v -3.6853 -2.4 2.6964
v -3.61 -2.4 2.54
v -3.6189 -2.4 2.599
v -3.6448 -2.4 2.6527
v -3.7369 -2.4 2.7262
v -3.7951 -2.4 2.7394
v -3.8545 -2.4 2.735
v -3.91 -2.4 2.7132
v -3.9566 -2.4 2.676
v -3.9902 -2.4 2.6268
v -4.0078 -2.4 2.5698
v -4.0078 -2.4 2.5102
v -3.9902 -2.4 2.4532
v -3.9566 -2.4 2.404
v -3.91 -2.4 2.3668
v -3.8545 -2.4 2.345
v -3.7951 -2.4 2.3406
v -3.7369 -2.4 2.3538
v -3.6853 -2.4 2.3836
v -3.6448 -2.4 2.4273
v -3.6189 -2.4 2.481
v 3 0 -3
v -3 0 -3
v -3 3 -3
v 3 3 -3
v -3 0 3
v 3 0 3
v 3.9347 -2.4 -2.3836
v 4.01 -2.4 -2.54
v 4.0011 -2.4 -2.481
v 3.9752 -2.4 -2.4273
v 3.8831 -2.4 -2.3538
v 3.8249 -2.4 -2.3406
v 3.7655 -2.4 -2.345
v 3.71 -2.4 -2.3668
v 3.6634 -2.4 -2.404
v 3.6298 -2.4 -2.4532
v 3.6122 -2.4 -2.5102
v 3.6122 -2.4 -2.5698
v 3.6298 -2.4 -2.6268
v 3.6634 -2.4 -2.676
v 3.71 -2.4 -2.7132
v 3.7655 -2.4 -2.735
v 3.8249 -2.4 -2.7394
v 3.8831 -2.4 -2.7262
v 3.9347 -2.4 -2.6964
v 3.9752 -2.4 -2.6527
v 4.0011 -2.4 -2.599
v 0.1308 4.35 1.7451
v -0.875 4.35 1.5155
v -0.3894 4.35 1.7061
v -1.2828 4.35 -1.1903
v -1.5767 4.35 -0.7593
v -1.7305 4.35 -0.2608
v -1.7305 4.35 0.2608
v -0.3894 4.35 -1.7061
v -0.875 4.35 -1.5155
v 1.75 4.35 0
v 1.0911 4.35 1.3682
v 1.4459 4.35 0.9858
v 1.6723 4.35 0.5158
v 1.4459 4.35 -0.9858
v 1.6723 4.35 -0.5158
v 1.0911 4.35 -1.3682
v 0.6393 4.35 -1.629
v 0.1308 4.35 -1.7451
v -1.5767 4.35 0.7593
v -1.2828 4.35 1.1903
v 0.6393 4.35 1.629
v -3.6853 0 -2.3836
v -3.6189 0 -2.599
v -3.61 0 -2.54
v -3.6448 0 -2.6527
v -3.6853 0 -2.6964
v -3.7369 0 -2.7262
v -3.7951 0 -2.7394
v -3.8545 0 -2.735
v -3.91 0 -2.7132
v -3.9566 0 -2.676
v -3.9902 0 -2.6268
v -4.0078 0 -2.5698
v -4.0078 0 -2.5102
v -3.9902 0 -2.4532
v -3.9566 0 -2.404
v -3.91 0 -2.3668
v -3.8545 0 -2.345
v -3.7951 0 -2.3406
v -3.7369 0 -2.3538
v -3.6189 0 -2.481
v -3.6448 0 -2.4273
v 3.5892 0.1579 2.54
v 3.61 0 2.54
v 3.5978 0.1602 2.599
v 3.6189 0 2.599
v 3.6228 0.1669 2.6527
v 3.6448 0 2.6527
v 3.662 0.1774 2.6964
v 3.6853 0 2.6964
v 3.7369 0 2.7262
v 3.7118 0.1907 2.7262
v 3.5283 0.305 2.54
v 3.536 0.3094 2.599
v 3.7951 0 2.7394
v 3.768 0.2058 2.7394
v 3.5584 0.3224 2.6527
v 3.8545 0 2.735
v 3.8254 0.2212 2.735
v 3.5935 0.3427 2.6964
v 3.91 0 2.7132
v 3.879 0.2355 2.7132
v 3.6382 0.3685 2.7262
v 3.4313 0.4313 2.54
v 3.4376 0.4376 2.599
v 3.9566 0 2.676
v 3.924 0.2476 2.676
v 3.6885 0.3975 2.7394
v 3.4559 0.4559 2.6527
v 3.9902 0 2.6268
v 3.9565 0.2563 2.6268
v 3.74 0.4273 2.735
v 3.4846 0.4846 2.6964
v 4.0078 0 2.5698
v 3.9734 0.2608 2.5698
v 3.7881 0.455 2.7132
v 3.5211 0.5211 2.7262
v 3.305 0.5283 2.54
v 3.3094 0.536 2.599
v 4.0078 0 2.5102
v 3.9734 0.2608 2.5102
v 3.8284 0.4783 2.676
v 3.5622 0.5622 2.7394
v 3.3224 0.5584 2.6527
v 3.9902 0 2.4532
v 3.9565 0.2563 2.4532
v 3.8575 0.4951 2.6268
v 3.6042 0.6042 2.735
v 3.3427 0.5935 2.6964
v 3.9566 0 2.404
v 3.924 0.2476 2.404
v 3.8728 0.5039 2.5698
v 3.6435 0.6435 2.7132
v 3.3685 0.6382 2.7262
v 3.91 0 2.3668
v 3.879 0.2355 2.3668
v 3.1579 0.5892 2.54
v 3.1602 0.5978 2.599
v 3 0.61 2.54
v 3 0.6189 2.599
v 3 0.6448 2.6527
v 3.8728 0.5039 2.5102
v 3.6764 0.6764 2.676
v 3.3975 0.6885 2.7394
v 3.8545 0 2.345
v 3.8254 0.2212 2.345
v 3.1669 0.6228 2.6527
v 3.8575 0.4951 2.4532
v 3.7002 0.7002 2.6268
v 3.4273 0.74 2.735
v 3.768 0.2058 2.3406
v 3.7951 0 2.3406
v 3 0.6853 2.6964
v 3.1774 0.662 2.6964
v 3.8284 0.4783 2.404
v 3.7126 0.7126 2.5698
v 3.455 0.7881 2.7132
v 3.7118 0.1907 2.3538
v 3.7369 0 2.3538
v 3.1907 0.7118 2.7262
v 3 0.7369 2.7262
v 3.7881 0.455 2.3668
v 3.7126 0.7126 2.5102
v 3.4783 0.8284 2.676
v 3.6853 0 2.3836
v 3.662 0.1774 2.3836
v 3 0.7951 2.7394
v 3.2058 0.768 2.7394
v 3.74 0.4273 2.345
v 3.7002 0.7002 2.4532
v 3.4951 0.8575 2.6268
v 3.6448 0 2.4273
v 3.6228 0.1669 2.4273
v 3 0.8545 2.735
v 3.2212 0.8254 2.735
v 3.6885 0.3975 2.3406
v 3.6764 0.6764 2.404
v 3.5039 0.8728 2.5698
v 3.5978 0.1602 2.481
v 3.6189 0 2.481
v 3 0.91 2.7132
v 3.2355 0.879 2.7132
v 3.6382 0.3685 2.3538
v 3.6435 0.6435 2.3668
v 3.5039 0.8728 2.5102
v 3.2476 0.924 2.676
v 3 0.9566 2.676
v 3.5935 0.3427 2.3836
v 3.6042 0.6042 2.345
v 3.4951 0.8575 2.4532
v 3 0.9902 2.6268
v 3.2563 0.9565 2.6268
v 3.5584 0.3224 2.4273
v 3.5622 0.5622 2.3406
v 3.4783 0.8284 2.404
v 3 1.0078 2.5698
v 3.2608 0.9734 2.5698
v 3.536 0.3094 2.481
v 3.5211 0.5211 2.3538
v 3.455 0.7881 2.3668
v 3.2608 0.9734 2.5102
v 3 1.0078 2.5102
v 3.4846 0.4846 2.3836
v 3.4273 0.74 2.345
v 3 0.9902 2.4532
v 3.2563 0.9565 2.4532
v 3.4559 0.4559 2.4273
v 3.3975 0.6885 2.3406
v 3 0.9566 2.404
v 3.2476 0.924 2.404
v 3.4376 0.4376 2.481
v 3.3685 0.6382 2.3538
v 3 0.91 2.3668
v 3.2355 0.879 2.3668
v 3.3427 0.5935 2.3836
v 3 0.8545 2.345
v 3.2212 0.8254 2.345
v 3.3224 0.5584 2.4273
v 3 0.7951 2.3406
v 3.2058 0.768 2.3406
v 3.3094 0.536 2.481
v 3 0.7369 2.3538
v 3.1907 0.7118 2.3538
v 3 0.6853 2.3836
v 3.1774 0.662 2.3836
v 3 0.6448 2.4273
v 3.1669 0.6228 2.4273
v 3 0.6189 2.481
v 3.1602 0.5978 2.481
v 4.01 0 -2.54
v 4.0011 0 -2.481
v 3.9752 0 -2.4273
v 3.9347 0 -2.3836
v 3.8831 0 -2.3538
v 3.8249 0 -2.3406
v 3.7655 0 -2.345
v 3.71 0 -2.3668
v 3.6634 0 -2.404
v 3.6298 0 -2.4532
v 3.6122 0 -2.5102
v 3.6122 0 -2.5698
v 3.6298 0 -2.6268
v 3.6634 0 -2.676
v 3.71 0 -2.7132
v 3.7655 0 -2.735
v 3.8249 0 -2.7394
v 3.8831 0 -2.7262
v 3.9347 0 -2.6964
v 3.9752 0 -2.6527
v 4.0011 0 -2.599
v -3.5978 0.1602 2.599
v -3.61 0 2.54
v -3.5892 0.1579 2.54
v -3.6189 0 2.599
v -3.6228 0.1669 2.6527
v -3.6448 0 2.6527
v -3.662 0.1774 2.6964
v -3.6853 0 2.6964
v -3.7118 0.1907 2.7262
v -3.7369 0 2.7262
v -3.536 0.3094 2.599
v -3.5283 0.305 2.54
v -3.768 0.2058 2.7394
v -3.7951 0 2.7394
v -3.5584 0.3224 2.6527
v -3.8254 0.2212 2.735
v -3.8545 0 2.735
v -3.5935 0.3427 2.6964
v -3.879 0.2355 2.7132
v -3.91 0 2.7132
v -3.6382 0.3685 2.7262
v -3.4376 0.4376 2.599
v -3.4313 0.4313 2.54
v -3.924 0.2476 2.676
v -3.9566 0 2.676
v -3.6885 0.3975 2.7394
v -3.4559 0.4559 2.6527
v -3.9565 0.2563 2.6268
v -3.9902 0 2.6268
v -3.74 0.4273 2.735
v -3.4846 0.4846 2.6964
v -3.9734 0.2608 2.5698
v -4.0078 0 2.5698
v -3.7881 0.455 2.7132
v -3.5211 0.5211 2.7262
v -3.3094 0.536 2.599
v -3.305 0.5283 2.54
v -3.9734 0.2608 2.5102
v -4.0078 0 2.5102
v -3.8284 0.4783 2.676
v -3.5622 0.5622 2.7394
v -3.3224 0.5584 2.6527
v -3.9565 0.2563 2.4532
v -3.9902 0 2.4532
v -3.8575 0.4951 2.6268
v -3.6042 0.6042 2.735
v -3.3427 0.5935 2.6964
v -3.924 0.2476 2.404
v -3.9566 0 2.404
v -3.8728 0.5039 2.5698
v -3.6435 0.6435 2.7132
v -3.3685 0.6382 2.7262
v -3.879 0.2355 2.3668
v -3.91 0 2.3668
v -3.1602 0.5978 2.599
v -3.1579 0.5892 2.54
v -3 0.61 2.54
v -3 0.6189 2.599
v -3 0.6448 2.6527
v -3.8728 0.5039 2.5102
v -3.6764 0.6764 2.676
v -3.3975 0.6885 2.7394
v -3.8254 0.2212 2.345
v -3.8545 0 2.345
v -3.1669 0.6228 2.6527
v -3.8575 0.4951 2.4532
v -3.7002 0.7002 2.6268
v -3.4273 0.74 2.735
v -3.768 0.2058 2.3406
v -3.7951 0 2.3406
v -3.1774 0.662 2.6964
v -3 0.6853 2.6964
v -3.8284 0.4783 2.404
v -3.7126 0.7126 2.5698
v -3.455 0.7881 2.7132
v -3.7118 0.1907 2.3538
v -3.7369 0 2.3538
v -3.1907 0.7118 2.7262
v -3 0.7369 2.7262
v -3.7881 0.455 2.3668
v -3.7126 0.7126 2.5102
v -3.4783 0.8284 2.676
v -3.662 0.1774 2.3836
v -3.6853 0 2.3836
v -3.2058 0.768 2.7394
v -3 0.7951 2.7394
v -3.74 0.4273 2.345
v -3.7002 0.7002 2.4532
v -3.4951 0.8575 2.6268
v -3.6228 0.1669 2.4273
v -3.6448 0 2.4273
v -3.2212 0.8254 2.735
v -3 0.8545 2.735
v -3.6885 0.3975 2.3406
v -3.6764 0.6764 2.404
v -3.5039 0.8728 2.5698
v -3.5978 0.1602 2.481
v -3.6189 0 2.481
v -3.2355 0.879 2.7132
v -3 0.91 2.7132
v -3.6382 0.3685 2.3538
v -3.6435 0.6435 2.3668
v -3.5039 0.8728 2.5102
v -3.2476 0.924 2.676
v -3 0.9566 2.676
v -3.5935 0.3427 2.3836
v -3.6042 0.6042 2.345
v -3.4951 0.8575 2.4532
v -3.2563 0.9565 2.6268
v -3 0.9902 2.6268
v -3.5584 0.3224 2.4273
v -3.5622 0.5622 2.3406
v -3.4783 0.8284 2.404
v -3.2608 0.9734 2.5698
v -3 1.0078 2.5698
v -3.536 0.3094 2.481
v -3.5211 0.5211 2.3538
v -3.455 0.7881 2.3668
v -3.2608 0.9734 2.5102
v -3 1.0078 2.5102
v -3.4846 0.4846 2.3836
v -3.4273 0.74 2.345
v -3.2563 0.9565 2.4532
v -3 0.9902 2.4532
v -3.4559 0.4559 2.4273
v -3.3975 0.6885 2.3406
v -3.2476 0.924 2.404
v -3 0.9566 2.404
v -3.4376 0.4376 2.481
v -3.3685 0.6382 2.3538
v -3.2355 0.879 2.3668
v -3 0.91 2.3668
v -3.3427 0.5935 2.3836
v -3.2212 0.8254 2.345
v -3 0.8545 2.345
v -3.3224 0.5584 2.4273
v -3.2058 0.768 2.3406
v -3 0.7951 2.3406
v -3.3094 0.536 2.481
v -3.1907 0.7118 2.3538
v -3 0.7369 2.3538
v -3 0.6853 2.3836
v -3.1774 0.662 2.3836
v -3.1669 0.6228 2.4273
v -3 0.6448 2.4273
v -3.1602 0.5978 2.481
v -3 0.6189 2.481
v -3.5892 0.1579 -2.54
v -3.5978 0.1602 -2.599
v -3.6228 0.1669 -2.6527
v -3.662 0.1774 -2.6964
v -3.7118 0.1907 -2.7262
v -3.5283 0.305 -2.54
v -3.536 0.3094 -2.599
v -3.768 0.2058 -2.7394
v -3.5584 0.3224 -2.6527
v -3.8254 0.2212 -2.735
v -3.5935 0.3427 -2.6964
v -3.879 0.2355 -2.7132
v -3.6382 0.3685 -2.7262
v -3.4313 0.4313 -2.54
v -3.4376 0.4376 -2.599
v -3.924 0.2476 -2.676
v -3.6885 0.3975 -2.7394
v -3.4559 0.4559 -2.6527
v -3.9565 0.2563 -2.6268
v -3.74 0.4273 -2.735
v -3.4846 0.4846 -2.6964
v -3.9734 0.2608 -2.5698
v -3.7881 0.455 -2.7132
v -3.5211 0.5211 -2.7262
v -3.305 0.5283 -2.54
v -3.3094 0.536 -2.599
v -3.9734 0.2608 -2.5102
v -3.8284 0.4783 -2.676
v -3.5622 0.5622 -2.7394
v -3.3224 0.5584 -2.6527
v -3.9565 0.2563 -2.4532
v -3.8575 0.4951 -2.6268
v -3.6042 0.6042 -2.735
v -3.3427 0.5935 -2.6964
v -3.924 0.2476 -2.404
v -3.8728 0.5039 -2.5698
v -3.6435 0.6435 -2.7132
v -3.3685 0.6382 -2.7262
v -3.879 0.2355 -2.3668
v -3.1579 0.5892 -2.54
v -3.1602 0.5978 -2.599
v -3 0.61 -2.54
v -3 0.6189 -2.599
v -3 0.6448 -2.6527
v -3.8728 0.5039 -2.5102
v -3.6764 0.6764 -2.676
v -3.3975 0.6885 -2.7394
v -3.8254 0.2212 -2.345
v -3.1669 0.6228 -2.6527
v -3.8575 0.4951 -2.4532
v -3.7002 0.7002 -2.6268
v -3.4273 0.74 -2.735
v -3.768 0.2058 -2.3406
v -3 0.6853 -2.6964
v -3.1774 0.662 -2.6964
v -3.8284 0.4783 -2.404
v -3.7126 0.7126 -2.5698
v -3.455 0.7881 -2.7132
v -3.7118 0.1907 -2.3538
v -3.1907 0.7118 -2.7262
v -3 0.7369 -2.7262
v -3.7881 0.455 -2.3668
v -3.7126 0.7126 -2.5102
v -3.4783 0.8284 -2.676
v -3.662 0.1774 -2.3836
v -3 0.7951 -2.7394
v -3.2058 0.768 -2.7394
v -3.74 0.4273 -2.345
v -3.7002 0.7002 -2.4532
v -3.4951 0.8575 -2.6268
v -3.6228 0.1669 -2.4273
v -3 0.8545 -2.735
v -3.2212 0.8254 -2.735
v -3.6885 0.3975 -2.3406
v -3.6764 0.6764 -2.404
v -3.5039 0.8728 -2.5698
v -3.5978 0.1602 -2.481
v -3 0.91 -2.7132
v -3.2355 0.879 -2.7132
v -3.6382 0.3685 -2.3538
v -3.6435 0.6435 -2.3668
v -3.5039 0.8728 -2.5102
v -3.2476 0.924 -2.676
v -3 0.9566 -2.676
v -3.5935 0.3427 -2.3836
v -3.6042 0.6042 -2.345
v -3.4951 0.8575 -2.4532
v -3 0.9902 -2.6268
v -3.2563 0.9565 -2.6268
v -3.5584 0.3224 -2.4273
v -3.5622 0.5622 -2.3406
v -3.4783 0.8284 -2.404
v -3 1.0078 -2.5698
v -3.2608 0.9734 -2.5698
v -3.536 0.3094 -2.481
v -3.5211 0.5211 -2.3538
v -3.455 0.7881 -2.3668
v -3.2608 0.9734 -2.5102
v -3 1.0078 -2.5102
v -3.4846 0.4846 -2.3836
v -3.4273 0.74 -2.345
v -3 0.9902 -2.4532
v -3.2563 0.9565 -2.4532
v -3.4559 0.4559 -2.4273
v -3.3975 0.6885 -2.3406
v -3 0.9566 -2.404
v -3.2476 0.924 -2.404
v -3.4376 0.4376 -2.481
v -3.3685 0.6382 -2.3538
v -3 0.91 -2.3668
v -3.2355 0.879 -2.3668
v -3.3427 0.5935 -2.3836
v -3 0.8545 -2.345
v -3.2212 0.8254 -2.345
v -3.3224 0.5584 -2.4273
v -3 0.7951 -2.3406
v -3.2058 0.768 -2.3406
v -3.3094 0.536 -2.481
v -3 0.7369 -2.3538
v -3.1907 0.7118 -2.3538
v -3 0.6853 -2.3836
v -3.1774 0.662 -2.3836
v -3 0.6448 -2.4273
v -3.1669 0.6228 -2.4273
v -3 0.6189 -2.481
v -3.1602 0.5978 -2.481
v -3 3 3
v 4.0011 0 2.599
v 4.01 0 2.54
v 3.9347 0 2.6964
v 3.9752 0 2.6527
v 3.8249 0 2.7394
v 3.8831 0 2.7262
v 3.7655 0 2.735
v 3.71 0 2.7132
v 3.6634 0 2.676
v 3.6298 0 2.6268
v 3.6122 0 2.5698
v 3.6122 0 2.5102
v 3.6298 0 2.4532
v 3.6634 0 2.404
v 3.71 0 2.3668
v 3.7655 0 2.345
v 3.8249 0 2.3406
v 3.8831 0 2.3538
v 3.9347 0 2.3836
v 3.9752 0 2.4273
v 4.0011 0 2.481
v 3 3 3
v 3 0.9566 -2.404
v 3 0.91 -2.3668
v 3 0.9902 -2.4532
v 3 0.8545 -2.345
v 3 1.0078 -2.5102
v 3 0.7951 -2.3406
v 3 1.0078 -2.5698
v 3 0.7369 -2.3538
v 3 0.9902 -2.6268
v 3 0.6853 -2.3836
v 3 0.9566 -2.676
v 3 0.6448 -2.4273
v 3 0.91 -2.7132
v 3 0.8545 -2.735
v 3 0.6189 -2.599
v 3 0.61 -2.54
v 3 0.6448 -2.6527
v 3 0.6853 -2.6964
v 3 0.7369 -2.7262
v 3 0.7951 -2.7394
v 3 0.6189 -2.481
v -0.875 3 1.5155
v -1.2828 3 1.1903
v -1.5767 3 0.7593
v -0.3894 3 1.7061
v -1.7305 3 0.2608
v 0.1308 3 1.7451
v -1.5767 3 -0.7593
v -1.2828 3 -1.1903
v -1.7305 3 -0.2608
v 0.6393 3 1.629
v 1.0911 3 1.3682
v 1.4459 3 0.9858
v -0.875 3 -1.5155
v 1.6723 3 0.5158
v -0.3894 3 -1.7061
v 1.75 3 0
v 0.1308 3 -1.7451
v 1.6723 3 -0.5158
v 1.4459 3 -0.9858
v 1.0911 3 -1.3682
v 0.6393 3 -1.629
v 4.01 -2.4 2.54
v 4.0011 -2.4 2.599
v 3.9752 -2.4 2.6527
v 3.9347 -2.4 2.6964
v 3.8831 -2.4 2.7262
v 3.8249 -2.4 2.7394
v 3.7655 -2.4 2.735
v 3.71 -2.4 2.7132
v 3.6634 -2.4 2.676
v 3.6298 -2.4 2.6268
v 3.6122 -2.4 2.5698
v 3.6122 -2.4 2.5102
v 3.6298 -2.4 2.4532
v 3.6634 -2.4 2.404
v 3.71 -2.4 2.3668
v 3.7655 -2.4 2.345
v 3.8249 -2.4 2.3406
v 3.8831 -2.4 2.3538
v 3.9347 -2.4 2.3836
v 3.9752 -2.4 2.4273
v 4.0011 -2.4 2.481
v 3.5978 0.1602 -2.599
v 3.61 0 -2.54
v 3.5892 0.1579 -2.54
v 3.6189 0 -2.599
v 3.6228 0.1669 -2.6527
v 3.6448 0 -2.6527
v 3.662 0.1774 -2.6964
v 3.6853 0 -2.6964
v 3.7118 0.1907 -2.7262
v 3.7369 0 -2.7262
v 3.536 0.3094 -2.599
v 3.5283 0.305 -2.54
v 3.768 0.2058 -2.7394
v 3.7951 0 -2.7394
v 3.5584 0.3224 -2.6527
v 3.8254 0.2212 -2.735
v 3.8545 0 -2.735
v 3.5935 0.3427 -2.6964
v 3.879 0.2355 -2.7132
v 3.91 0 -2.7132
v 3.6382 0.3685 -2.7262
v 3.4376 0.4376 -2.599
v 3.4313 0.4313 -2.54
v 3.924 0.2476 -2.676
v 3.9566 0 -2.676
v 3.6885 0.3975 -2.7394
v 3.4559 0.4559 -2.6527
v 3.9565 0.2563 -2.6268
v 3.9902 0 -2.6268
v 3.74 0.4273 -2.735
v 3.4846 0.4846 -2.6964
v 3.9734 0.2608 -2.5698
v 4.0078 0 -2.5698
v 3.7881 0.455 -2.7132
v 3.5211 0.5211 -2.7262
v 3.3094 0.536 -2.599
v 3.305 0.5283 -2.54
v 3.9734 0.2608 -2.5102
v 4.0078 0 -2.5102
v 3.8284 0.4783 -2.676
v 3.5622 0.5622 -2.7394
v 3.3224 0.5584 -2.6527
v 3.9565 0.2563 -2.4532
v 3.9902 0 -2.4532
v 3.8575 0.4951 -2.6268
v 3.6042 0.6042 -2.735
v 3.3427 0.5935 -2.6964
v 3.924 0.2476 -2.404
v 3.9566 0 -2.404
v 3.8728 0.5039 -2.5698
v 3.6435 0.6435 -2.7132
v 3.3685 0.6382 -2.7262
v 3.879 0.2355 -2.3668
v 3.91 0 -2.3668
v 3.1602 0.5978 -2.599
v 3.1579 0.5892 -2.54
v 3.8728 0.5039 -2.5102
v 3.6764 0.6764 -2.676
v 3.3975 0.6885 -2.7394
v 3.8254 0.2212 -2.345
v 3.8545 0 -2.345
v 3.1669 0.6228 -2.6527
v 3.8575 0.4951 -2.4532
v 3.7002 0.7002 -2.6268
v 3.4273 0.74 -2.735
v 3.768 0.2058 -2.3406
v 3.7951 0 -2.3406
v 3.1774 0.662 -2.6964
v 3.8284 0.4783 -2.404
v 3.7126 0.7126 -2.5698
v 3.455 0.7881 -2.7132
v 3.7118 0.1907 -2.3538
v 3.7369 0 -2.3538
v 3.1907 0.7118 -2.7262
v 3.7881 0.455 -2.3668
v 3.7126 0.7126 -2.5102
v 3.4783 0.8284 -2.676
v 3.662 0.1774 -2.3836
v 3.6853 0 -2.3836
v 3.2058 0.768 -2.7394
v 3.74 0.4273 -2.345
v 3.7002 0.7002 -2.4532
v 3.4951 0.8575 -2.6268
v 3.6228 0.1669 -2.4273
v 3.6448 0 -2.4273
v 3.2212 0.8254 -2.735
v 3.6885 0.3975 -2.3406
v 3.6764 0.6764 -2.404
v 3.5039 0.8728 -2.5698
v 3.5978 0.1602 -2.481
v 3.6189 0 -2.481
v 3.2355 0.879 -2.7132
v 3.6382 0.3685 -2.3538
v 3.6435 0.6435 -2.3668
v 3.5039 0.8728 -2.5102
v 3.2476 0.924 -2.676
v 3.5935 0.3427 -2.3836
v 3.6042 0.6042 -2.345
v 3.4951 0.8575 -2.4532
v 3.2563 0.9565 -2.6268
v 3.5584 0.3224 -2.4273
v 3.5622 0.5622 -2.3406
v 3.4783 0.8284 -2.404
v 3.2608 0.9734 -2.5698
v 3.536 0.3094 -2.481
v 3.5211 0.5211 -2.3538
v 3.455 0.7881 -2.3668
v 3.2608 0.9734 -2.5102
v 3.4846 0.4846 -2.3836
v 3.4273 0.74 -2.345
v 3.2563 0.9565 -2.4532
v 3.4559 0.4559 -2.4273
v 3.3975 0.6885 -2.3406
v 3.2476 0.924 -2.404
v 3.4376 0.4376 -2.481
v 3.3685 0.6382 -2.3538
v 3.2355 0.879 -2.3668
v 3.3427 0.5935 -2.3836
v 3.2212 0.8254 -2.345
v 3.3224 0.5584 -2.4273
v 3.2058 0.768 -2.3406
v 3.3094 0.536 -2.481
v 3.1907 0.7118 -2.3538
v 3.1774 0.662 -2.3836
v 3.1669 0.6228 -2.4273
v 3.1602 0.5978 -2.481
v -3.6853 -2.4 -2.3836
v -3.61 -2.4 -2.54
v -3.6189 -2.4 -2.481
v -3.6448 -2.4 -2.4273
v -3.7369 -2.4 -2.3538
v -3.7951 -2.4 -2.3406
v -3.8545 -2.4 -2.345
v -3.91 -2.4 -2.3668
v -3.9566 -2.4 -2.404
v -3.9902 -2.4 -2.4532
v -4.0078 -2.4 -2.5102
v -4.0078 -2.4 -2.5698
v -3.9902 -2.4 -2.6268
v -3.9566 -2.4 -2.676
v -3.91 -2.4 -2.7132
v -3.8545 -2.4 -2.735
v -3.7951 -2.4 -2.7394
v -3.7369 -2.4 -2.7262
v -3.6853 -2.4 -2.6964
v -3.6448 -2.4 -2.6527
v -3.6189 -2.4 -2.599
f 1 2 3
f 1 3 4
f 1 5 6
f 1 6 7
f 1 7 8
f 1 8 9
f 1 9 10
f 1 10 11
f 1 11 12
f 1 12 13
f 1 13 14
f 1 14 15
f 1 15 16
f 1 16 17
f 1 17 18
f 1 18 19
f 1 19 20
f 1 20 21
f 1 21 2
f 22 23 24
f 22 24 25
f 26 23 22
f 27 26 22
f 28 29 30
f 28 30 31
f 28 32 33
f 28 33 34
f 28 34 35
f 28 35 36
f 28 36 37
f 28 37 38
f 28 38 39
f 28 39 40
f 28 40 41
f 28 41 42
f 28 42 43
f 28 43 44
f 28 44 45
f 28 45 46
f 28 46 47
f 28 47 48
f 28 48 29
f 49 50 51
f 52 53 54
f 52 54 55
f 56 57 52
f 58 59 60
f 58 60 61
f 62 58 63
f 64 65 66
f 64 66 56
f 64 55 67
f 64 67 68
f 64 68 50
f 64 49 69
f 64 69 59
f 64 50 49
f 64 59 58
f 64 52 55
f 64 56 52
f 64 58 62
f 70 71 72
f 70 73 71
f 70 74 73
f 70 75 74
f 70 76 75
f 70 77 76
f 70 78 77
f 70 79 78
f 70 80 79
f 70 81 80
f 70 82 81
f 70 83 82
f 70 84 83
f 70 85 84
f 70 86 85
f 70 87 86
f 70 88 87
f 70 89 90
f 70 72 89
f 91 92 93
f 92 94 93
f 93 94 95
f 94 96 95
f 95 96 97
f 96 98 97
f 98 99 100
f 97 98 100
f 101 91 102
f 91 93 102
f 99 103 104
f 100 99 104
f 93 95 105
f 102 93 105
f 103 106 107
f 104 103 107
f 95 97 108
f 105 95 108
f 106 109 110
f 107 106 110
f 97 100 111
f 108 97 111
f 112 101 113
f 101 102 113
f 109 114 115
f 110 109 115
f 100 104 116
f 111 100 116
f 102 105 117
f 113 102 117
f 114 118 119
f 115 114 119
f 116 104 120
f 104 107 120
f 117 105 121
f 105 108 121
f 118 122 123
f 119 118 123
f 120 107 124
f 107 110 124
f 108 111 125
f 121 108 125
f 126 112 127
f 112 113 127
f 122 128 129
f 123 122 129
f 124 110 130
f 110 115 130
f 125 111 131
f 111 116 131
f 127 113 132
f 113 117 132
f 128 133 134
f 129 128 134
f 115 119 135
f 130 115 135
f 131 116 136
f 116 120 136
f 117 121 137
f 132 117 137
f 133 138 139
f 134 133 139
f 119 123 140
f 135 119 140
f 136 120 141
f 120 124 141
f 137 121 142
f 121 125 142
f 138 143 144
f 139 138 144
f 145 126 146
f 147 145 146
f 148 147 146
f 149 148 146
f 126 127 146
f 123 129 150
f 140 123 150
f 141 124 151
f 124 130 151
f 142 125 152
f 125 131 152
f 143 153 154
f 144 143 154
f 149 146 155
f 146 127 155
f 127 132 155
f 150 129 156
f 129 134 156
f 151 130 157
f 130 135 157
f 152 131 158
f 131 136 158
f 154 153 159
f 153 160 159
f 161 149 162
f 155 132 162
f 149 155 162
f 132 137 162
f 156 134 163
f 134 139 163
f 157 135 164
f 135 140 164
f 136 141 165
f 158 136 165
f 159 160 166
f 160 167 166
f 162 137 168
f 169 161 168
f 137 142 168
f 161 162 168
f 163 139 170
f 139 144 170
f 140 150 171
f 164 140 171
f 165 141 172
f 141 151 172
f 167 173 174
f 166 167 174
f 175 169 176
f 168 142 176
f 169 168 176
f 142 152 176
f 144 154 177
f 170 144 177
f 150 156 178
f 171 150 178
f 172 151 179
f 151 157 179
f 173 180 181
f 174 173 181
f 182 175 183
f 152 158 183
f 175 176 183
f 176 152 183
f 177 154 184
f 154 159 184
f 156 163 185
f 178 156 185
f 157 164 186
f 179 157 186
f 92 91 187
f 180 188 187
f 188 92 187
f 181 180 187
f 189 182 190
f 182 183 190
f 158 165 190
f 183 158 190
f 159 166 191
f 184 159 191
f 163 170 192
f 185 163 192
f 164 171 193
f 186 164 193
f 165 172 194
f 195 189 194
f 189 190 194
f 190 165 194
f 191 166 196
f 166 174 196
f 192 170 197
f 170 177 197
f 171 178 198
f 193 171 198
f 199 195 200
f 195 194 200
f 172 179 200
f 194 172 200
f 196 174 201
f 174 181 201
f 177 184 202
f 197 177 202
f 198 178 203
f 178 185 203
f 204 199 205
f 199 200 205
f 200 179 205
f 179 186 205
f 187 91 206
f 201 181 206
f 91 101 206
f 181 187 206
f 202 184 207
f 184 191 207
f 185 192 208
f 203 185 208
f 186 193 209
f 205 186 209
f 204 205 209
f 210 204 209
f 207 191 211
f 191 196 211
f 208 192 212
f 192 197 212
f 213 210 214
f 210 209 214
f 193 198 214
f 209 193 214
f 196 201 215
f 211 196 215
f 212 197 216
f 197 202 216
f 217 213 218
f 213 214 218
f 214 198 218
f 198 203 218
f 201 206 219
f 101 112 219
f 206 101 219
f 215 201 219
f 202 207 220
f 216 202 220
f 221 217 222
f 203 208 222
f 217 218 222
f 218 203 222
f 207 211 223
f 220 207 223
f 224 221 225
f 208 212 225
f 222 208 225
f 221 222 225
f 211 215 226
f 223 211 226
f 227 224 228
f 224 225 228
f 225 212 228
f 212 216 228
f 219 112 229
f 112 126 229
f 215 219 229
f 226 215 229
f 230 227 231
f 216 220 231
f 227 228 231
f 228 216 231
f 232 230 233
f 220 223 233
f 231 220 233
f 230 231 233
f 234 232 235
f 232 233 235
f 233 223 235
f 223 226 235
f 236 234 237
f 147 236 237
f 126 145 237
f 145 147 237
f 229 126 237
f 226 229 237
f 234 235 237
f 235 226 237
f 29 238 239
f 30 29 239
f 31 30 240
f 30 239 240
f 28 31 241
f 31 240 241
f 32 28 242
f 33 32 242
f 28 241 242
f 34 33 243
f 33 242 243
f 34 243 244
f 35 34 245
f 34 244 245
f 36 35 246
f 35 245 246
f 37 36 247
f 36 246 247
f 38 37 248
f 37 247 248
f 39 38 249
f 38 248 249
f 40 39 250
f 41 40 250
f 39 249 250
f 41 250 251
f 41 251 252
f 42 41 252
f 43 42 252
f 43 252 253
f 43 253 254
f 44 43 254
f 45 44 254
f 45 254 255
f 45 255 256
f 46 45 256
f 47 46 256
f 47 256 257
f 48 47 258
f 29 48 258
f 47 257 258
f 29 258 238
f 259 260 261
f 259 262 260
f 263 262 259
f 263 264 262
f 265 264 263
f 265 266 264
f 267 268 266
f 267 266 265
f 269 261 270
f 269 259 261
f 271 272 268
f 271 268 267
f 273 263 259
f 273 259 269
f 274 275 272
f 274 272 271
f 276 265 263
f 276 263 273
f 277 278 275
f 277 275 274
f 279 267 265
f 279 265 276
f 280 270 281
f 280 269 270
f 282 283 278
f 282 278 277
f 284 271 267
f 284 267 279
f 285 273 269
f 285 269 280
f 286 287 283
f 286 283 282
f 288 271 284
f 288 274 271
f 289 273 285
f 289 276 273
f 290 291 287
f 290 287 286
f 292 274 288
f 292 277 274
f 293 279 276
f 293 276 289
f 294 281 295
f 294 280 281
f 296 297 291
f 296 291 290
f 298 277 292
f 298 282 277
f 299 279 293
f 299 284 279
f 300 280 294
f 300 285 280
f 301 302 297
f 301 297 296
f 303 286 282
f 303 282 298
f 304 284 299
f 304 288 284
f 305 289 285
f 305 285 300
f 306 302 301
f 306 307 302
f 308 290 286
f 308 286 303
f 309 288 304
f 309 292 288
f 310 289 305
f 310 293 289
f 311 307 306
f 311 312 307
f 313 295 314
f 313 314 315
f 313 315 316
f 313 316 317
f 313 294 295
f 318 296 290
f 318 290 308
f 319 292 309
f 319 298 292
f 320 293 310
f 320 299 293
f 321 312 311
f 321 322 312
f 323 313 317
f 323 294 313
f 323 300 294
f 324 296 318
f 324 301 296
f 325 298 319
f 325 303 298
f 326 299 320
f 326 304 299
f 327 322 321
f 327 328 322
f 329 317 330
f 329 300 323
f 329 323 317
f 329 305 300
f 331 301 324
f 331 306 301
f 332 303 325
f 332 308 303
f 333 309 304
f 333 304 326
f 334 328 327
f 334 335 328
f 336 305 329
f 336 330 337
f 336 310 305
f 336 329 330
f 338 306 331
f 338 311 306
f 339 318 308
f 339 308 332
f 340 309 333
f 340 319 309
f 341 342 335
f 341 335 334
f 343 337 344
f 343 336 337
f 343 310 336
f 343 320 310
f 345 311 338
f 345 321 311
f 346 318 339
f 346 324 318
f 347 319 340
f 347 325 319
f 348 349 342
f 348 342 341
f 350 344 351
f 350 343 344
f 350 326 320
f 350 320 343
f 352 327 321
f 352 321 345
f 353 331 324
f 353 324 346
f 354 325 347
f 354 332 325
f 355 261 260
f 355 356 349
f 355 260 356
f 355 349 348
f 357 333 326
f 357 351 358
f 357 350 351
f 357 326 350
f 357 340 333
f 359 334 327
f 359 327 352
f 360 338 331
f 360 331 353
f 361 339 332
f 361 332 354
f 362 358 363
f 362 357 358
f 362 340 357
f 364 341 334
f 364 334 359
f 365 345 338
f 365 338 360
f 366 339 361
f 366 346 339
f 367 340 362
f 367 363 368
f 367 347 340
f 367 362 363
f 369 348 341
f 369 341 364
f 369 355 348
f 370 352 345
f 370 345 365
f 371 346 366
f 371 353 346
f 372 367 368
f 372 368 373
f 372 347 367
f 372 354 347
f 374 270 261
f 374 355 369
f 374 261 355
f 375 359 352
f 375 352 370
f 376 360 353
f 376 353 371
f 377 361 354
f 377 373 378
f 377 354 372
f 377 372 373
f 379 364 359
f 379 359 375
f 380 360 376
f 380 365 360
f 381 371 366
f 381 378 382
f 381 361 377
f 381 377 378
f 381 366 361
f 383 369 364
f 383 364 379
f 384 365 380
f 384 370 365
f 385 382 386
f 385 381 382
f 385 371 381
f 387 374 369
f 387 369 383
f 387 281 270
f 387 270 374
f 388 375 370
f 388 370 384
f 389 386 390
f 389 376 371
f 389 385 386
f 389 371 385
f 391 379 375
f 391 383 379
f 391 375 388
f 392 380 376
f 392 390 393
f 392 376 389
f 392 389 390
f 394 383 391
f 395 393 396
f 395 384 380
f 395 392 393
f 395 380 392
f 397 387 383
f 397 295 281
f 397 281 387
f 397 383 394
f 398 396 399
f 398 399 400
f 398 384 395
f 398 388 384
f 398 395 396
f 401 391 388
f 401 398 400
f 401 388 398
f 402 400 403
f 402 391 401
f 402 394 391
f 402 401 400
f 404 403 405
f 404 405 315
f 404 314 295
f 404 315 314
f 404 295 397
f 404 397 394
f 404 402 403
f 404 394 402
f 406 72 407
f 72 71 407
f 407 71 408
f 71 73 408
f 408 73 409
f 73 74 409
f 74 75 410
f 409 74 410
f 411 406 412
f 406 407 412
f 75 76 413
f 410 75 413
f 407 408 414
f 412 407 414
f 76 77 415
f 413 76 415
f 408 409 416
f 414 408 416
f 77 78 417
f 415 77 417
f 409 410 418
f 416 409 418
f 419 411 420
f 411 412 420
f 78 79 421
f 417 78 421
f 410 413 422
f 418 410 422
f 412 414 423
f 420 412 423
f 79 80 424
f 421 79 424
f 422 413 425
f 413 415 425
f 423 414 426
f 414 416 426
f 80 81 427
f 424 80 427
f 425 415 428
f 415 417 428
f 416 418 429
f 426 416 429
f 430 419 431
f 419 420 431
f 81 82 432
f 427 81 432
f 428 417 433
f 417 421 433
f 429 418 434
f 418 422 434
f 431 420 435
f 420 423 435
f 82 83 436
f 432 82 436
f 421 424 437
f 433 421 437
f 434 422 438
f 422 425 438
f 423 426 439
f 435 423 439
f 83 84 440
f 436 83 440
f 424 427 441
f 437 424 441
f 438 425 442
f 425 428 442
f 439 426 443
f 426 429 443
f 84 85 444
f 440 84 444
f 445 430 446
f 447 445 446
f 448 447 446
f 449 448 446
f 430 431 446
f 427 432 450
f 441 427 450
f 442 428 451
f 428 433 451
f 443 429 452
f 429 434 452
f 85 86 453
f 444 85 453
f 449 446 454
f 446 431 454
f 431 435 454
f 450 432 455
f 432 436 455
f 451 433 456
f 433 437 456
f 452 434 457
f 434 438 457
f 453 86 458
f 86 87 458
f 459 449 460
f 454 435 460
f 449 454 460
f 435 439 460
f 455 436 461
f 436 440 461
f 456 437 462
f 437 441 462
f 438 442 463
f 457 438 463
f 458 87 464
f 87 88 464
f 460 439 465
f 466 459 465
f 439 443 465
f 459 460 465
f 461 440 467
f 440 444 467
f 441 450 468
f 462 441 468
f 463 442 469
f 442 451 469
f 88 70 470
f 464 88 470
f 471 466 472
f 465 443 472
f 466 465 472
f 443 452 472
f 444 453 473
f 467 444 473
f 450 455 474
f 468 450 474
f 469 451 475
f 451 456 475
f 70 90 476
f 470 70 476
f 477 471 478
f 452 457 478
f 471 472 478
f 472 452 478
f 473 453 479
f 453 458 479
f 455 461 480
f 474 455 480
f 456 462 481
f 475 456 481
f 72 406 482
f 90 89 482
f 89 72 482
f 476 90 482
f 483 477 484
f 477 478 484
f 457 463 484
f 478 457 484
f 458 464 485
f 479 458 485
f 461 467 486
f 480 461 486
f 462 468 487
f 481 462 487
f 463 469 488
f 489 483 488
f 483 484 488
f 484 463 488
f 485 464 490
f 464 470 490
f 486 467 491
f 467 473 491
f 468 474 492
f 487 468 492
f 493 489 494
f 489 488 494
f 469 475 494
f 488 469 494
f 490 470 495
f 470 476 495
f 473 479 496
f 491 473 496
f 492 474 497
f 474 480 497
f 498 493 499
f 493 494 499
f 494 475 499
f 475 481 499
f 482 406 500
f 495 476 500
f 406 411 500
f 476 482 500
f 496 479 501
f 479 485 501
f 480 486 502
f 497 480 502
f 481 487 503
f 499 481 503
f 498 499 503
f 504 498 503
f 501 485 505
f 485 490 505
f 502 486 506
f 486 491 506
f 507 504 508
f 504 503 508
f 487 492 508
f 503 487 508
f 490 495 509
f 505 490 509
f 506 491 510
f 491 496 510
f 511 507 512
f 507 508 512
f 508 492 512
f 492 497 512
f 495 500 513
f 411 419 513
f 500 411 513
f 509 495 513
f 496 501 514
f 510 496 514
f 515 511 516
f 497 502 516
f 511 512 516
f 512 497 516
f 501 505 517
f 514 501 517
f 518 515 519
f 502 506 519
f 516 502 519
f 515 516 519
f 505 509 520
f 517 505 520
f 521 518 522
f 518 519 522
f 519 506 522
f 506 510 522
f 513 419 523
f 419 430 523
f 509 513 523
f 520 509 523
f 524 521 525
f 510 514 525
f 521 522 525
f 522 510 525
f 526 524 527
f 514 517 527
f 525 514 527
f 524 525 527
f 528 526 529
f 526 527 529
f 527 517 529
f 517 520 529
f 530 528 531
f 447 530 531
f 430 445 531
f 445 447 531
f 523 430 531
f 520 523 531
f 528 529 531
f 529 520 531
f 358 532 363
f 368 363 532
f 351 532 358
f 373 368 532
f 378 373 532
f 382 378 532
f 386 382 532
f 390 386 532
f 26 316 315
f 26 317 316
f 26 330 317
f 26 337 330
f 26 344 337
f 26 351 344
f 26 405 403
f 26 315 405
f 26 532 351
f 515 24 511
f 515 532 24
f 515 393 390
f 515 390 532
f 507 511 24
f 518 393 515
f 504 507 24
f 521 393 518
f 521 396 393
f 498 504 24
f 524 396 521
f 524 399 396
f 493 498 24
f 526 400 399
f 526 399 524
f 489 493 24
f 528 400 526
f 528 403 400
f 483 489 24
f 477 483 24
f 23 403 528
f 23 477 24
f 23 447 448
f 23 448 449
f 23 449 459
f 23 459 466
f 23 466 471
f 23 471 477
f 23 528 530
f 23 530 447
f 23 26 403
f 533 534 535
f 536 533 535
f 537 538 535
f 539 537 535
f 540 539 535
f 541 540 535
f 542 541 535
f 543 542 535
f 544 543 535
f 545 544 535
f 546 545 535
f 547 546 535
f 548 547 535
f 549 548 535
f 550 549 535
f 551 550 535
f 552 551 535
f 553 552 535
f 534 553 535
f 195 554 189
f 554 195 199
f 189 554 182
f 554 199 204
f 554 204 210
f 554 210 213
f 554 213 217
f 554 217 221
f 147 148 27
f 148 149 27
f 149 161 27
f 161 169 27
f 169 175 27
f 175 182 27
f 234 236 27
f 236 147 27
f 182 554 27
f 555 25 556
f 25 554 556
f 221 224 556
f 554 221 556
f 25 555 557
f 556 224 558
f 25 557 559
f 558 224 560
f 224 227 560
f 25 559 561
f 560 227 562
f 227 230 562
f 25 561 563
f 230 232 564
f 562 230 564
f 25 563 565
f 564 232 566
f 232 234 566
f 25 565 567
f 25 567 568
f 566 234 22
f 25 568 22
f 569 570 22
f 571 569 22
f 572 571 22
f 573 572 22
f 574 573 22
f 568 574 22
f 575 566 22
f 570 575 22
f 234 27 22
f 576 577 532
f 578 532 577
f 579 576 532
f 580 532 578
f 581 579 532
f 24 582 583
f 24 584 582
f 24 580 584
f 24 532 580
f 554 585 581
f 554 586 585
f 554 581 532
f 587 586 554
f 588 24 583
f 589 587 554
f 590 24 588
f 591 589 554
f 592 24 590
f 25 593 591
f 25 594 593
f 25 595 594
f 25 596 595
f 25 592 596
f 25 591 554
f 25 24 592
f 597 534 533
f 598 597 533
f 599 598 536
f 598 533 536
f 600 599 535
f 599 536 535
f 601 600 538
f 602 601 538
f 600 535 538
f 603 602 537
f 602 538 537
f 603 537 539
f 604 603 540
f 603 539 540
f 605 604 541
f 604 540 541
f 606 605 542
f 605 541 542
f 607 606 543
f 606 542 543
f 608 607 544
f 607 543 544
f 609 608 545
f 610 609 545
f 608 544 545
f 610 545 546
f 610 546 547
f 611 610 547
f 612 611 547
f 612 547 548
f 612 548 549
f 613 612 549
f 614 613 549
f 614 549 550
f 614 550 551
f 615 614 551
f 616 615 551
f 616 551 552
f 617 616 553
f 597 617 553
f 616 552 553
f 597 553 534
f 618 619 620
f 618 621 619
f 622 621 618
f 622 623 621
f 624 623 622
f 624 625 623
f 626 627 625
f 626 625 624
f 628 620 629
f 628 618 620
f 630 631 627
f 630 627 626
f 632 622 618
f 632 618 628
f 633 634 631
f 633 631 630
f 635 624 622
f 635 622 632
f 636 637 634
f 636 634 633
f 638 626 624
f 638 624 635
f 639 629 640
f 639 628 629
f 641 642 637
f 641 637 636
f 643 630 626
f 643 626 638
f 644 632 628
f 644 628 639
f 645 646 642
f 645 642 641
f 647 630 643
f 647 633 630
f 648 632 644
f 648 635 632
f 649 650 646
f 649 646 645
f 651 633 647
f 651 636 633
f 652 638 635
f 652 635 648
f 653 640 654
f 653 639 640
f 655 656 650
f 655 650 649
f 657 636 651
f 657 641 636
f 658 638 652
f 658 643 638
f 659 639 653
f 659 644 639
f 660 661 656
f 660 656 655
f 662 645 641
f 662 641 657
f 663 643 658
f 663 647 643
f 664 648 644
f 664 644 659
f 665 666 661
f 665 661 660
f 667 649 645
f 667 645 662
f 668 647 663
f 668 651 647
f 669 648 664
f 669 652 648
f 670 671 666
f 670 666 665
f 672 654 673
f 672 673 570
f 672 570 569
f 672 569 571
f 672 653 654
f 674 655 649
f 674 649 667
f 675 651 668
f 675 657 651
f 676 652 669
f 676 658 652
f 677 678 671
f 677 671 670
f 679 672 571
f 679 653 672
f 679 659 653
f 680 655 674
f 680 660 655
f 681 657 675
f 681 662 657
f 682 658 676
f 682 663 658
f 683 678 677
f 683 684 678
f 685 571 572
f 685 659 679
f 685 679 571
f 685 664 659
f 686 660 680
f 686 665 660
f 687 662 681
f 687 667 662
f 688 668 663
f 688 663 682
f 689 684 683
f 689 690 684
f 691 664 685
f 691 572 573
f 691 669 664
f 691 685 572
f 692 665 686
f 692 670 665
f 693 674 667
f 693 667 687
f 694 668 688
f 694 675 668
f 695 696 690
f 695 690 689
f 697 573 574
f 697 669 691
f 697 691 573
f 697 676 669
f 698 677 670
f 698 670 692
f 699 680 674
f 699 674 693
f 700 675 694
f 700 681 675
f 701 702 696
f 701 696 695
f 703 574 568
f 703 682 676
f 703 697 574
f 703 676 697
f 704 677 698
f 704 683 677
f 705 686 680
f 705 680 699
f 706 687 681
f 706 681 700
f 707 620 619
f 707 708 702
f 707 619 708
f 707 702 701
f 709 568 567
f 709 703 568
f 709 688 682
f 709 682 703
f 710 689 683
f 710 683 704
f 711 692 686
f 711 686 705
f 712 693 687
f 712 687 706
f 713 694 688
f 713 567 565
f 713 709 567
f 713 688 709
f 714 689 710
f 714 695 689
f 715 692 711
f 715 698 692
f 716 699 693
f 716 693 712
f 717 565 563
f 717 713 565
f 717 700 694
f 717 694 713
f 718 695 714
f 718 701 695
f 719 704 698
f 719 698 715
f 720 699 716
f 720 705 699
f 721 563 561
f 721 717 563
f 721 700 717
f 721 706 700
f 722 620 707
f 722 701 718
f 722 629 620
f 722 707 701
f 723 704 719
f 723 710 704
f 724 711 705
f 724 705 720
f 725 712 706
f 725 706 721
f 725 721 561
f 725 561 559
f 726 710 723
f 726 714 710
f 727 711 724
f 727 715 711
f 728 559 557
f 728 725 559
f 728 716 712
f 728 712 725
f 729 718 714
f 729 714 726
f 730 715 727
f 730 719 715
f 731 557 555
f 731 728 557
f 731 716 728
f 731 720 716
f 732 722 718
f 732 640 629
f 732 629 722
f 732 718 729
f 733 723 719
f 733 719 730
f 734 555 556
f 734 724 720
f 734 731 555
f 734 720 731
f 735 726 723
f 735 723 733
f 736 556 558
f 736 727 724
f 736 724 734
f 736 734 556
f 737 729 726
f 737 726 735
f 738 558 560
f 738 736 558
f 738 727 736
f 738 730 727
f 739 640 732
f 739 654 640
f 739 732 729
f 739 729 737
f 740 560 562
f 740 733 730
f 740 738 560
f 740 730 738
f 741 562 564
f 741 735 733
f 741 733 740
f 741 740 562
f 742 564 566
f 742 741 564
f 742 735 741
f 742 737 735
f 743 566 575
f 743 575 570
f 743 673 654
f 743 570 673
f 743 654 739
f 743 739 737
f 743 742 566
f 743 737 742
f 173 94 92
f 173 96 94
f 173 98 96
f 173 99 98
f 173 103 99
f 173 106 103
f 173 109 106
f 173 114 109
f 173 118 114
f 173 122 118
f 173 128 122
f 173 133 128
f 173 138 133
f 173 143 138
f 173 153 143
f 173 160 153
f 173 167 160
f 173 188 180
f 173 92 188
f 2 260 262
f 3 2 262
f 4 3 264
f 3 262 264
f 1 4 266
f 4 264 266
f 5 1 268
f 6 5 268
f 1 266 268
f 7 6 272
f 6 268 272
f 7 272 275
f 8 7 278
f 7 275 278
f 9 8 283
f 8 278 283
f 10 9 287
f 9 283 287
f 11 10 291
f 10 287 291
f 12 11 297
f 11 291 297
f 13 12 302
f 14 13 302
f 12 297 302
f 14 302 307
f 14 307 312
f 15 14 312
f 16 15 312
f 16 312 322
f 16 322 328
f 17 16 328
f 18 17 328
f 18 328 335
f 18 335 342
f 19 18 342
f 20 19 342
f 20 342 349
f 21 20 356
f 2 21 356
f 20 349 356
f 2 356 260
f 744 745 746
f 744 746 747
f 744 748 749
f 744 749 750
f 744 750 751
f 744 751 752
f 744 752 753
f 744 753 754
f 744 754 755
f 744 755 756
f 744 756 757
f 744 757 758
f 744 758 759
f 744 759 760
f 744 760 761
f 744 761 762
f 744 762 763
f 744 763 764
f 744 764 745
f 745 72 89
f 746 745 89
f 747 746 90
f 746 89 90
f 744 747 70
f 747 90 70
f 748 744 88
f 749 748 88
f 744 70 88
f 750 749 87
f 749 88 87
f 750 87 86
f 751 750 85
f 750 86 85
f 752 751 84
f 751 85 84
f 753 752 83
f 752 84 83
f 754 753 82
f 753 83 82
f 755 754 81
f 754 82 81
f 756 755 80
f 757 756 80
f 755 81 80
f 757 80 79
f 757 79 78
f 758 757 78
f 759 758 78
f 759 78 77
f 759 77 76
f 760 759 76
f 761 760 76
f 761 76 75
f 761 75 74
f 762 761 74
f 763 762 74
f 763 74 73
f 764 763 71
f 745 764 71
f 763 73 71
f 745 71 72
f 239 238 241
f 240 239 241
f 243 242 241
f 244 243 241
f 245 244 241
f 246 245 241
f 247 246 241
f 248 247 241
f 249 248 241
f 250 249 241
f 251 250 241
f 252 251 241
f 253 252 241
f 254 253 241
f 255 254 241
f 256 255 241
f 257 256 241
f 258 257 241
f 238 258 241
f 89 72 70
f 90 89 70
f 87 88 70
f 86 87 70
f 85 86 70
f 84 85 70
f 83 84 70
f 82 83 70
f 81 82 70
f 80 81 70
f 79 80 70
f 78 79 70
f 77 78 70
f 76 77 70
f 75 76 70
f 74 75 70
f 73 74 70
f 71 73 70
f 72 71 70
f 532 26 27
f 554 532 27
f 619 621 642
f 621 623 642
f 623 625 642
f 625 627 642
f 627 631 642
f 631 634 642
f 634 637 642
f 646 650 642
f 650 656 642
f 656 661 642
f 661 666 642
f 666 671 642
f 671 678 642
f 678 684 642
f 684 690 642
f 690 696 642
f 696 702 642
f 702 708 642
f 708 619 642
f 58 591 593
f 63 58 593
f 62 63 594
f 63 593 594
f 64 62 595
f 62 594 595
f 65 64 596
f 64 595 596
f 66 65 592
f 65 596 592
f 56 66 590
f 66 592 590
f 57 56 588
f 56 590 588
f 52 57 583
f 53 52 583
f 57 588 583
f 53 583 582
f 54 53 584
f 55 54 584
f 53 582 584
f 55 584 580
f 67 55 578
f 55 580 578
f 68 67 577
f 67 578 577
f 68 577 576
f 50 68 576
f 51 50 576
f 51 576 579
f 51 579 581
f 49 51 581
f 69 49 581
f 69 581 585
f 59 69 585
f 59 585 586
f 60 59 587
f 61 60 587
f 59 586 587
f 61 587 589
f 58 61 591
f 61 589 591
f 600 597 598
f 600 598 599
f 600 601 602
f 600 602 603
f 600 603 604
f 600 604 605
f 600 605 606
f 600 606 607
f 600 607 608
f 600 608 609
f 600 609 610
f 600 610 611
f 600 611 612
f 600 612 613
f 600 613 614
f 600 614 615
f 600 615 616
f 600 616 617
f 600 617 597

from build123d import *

# Parameters (mm, degrees)
SKETCH1_W                                  = 6
SKETCH1_H                                  = 6
BOSS_EXTRUDE1_DEPTH                        = 3
SKETCH2_R                                  = 1.75
BOSS_EXTRUDE2_DEPTH                        = 1.35
SKETCH3_R                                  = 0.2
BOSS_EXTRUDE3_DEPTH                        = 2.4
BOSS_EXTRUDE3_2_DEPTH                      = 2.4
BOSS_EXTRUDE3_3_DEPTH                      = 2.4
BOSS_EXTRUDE3_4_DEPTH                      = 2.4
SWEEP1_PROFILE_R                           = 0.2
MIRROR1_AT_THE_SECOND_PLANE_COPY_1_SKETC_R = 0.2


with BuildPart() as part:
    # Sketch1 → Boss-Extrude1 (new body)
    with BuildSketch(Plane(origin=(0, 0, 0), x_dir=(1, 0, 0), z_dir=(0, 1, 0))):
        Rectangle(SKETCH1_W, SKETCH1_H)
    extrude(amount=BOSS_EXTRUDE1_DEPTH)

    # Sketch2 → Boss-Extrude2 (add)
    with BuildSketch(Plane(origin=(0, 3, 0), x_dir=(1, 0, 0), z_dir=(0, 1, 0))):
        Circle(SKETCH2_R)
    extrude(amount=BOSS_EXTRUDE2_DEPTH)



with BuildPart() as body_2:
    # Sketch3 → Boss-Extrude3 (new body)
    with BuildSketch(Plane.XZ):
        with Locations((-3.81, 2.54)):
            Circle(SKETCH3_R)
    extrude(amount=BOSS_EXTRUDE3_DEPTH)


with BuildPart() as body_3:
    # Sketch3 → Boss-Extrude3 2 (new body)
    with BuildSketch(Plane.XZ):
        with Locations((3.81, 2.54)):
            Circle(SKETCH3_R)
    extrude(amount=BOSS_EXTRUDE3_2_DEPTH)


with BuildPart() as body_4:
    # Sketch3 → Boss-Extrude3 3 (new body)
    with BuildSketch(Plane.XZ):
        with Locations((3.81, -2.54)):
            Circle(SKETCH3_R)
    extrude(amount=BOSS_EXTRUDE3_3_DEPTH)


with BuildPart() as body_5:
    # Sketch3 → Boss-Extrude3 4 (new body)
    with BuildSketch(Plane.XZ):
        with Locations((-3.81, -2.54)):
            Circle(SKETCH3_R)
    extrude(amount=BOSS_EXTRUDE3_4_DEPTH)


with BuildPart() as part_1:
    add(part.part)

    add(body_2.part)  # Sweep1 merges body 2
    # Sweep1: sweep along a path in Sketch4
    with BuildLine(Plane.XY.offset(2.54)) as sweep1_path:
        ThreePointArc((-3.81, 0), (-3.572756493, 0.572756493), (-3, 0.81))
    # Sweep1 profile (on start of the path) → Sweep1 (sweep)
    with BuildSketch(Plane(origin=(-3.81, 0, 2.54), x_dir=(1, 0, 0), z_dir=(0, 1, 0))):
        Circle(SWEEP1_PROFILE_R)
    sweep1 = sweep(path=sweep1_path.line)

    # Mirror1: Sweep1 across plane
    add(sweep1.mirror(Plane(origin=(0, 0, 0), x_dir=(0, 0, 1), z_dir=(1, 0, 0))))

    # Mirror1 at the second plane: Sweep1 across plane
    add(sweep1.mirror(Plane.XY))

    # Mirror1 at the second plane copy 1: sweep along a path in Mirror1 at the second plane copy 1 path
    with BuildLine(Plane(origin=(0, 0, -2.54), x_dir=(-1, 0, 0), z_dir=(0, 0, -1))) as mirror1_at_the_second_plane_copy_1_path:
        ThreePointArc((-3.81, 0), (-3.572756493, 0.572756493), (-3, 0.81))
    # Mirror1 at the second plane copy 1 sketc → Mirror1 at the second plane copy 1 (sweep)
    with BuildSketch(Plane(origin=(3.81, 0, -2.54), x_dir=(-1, 0, 0), z_dir=(0, 1, 0))):
        Circle(MIRROR1_AT_THE_SECOND_PLANE_COPY_1_SKETC_R)
    sweep(path=mirror1_at_the_second_plane_copy_1_path.line)


solid = Compound([body_3.part, body_4.part, body_5.part, part_1.part])
